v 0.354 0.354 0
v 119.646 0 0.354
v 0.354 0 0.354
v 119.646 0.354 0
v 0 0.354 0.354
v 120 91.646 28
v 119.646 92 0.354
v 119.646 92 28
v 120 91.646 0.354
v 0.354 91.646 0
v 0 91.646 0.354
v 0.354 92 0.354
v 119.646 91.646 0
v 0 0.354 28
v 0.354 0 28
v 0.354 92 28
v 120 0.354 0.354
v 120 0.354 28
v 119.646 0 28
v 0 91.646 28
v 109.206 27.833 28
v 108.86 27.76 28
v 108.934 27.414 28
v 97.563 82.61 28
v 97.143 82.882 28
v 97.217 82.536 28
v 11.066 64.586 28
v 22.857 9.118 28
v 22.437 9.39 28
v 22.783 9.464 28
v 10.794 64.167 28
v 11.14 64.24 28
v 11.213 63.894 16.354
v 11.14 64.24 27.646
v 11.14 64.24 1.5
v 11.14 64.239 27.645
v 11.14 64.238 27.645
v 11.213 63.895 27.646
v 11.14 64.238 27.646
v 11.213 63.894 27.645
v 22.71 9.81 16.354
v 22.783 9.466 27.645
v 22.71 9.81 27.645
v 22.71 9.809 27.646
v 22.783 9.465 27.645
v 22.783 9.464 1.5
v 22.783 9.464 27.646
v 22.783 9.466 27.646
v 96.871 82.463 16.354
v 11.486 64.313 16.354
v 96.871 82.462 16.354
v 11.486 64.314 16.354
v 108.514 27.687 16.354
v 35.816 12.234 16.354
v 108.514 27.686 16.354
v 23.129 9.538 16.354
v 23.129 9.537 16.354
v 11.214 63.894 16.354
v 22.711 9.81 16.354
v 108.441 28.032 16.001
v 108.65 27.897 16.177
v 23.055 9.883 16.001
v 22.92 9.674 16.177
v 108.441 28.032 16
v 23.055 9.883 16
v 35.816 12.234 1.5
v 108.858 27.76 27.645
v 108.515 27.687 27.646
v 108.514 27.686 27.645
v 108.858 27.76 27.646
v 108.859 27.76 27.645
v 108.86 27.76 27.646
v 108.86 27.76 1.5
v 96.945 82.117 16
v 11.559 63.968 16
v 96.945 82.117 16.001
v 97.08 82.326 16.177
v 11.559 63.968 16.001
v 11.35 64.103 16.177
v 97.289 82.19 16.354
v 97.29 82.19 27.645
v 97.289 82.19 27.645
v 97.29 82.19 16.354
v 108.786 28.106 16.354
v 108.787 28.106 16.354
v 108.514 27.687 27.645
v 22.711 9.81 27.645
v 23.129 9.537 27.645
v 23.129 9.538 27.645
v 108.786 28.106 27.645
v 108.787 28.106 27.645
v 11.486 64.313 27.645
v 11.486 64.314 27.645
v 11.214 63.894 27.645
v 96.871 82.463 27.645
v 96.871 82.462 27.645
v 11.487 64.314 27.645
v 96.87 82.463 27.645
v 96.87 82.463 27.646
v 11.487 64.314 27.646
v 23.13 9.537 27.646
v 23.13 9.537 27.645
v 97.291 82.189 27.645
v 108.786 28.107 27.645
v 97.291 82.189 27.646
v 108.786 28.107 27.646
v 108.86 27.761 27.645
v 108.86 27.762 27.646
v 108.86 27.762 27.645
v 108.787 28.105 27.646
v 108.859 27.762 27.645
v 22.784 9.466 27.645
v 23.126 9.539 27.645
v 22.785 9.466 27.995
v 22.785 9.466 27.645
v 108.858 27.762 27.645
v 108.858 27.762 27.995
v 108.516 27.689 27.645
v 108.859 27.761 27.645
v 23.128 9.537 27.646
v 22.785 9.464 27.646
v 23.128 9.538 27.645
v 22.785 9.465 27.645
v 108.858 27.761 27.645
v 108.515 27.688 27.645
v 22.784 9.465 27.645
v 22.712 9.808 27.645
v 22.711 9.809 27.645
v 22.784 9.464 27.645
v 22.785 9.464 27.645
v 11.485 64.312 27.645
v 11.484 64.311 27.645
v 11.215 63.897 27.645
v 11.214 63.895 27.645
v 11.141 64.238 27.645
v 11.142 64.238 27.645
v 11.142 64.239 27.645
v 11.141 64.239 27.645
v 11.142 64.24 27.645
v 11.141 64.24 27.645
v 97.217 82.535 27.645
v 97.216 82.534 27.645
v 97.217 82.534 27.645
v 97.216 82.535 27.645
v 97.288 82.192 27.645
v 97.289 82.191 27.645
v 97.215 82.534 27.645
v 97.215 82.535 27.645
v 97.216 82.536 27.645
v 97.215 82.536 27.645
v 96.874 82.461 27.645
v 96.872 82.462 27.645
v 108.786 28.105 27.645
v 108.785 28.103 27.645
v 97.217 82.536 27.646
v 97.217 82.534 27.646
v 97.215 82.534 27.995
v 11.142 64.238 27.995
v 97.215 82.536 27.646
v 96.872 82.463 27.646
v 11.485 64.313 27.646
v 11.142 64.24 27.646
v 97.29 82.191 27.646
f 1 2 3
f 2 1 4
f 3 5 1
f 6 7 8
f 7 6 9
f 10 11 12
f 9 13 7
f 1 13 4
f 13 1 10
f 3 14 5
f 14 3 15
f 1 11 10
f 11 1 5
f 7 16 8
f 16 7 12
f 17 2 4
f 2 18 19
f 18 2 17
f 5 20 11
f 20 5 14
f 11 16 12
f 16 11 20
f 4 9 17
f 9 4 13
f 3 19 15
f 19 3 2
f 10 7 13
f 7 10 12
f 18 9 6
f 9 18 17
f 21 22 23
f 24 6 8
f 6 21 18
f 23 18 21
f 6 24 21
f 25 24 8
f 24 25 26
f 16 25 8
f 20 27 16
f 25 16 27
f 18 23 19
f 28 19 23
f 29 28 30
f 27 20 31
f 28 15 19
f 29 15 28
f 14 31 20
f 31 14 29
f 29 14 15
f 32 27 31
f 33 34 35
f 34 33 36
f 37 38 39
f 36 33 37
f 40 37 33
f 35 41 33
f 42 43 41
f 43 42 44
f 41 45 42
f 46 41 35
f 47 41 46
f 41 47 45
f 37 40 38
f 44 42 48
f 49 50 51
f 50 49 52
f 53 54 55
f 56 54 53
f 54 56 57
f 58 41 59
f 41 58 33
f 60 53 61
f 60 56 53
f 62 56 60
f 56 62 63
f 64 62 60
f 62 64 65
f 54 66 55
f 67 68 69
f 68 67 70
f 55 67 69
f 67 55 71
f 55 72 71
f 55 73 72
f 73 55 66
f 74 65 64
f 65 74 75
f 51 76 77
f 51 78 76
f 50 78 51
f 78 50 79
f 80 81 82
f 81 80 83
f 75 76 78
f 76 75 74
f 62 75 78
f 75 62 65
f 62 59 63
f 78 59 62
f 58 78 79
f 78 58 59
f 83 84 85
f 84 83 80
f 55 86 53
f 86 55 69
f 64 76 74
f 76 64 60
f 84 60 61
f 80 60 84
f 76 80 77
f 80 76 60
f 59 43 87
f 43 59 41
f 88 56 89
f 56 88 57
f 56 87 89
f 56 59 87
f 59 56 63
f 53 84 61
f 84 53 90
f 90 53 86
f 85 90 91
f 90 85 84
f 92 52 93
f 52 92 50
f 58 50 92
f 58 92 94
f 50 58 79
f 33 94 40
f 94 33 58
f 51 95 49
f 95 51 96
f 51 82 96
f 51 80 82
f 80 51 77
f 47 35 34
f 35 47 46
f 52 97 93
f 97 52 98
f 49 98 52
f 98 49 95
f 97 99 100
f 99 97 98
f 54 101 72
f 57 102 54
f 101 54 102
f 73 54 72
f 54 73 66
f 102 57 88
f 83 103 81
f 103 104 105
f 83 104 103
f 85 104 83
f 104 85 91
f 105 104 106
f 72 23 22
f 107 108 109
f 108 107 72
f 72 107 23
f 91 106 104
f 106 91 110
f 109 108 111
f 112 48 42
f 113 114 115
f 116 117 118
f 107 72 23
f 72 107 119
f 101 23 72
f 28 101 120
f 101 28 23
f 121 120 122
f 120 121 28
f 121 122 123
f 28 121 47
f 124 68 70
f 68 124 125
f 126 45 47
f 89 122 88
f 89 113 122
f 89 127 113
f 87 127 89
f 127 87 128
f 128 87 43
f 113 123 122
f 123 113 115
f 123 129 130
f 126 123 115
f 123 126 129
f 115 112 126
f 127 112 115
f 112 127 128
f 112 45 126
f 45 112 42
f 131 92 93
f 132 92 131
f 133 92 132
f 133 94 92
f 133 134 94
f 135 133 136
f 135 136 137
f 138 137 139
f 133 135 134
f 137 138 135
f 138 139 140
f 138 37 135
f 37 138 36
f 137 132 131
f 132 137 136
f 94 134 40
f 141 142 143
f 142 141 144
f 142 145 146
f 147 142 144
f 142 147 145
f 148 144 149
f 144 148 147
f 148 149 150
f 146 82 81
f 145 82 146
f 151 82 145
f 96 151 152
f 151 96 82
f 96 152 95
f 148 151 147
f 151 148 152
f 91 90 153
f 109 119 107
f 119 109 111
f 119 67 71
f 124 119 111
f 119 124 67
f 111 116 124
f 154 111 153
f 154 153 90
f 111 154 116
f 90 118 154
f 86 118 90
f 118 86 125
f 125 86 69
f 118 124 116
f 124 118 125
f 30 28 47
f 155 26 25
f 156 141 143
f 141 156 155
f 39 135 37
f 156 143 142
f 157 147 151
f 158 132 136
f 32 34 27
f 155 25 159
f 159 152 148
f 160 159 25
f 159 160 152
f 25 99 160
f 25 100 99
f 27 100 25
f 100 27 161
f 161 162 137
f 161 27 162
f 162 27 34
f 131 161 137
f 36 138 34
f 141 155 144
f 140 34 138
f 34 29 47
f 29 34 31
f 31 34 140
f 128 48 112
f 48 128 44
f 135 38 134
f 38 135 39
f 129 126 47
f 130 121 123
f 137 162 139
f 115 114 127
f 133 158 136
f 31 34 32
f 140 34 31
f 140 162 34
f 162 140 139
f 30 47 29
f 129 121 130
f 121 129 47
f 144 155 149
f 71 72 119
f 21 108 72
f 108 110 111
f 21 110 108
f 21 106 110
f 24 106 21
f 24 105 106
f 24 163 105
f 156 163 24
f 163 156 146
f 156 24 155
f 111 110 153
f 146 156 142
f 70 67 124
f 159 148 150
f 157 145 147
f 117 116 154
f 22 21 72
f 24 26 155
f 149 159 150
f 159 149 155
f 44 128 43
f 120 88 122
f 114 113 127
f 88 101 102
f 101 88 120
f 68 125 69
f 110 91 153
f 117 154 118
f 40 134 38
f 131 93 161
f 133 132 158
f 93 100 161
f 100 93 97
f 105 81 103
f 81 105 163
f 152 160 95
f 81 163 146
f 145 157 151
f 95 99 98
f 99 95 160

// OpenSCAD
// Practical nested geometry example:
// A shallow diagonal market-row tray has deeper bonus-tile wells cut into its
// floor, with the nested child rotated relative to the parent tray.
include <../../../release/lib/boardgame_insert_toolkit_lib.4.scad>;

data = [
    [ G_PRINT_LID_B, false ],
    [ G_PRINT_BOX_B, true ],
    [ G_ISOLATED_PRINT_BOX, "" ],

    [ OBJECT_BOX,
        [ NAME, "diagonal market tray with bonus wells" ],
        [ BOX_SIZE_XYZ, [120, 92, 28] ],
        [ BOX_NO_LID_B, true ],
        [ BOX_FEATURE,
            [ NAME, "angled market card row" ],
            [ FTR_COMPARTMENT_SIZE_XYZ, [88, 56, 12] ],
            [ POSITION_XY, [CENTER, CENTER] ],
            [ ROTATION, 12 ],

            [ BOX_FEATURE,
                [ NAME, "deeper rotated bonus-tile wells" ],
                [ FTR_NUM_COMPARTMENTS_XY, [2, 1] ],
                [ FTR_COMPARTMENT_SIZE_XYZ, [16, 12, 24] ],
                [ FTR_PADDING_XY, [5, 1] ],
                [ POSITION_XY, [CENTER, MAX] ],
                [ ROTATION, -35 ],
            ],
        ],
    ],
];

Make(data);
